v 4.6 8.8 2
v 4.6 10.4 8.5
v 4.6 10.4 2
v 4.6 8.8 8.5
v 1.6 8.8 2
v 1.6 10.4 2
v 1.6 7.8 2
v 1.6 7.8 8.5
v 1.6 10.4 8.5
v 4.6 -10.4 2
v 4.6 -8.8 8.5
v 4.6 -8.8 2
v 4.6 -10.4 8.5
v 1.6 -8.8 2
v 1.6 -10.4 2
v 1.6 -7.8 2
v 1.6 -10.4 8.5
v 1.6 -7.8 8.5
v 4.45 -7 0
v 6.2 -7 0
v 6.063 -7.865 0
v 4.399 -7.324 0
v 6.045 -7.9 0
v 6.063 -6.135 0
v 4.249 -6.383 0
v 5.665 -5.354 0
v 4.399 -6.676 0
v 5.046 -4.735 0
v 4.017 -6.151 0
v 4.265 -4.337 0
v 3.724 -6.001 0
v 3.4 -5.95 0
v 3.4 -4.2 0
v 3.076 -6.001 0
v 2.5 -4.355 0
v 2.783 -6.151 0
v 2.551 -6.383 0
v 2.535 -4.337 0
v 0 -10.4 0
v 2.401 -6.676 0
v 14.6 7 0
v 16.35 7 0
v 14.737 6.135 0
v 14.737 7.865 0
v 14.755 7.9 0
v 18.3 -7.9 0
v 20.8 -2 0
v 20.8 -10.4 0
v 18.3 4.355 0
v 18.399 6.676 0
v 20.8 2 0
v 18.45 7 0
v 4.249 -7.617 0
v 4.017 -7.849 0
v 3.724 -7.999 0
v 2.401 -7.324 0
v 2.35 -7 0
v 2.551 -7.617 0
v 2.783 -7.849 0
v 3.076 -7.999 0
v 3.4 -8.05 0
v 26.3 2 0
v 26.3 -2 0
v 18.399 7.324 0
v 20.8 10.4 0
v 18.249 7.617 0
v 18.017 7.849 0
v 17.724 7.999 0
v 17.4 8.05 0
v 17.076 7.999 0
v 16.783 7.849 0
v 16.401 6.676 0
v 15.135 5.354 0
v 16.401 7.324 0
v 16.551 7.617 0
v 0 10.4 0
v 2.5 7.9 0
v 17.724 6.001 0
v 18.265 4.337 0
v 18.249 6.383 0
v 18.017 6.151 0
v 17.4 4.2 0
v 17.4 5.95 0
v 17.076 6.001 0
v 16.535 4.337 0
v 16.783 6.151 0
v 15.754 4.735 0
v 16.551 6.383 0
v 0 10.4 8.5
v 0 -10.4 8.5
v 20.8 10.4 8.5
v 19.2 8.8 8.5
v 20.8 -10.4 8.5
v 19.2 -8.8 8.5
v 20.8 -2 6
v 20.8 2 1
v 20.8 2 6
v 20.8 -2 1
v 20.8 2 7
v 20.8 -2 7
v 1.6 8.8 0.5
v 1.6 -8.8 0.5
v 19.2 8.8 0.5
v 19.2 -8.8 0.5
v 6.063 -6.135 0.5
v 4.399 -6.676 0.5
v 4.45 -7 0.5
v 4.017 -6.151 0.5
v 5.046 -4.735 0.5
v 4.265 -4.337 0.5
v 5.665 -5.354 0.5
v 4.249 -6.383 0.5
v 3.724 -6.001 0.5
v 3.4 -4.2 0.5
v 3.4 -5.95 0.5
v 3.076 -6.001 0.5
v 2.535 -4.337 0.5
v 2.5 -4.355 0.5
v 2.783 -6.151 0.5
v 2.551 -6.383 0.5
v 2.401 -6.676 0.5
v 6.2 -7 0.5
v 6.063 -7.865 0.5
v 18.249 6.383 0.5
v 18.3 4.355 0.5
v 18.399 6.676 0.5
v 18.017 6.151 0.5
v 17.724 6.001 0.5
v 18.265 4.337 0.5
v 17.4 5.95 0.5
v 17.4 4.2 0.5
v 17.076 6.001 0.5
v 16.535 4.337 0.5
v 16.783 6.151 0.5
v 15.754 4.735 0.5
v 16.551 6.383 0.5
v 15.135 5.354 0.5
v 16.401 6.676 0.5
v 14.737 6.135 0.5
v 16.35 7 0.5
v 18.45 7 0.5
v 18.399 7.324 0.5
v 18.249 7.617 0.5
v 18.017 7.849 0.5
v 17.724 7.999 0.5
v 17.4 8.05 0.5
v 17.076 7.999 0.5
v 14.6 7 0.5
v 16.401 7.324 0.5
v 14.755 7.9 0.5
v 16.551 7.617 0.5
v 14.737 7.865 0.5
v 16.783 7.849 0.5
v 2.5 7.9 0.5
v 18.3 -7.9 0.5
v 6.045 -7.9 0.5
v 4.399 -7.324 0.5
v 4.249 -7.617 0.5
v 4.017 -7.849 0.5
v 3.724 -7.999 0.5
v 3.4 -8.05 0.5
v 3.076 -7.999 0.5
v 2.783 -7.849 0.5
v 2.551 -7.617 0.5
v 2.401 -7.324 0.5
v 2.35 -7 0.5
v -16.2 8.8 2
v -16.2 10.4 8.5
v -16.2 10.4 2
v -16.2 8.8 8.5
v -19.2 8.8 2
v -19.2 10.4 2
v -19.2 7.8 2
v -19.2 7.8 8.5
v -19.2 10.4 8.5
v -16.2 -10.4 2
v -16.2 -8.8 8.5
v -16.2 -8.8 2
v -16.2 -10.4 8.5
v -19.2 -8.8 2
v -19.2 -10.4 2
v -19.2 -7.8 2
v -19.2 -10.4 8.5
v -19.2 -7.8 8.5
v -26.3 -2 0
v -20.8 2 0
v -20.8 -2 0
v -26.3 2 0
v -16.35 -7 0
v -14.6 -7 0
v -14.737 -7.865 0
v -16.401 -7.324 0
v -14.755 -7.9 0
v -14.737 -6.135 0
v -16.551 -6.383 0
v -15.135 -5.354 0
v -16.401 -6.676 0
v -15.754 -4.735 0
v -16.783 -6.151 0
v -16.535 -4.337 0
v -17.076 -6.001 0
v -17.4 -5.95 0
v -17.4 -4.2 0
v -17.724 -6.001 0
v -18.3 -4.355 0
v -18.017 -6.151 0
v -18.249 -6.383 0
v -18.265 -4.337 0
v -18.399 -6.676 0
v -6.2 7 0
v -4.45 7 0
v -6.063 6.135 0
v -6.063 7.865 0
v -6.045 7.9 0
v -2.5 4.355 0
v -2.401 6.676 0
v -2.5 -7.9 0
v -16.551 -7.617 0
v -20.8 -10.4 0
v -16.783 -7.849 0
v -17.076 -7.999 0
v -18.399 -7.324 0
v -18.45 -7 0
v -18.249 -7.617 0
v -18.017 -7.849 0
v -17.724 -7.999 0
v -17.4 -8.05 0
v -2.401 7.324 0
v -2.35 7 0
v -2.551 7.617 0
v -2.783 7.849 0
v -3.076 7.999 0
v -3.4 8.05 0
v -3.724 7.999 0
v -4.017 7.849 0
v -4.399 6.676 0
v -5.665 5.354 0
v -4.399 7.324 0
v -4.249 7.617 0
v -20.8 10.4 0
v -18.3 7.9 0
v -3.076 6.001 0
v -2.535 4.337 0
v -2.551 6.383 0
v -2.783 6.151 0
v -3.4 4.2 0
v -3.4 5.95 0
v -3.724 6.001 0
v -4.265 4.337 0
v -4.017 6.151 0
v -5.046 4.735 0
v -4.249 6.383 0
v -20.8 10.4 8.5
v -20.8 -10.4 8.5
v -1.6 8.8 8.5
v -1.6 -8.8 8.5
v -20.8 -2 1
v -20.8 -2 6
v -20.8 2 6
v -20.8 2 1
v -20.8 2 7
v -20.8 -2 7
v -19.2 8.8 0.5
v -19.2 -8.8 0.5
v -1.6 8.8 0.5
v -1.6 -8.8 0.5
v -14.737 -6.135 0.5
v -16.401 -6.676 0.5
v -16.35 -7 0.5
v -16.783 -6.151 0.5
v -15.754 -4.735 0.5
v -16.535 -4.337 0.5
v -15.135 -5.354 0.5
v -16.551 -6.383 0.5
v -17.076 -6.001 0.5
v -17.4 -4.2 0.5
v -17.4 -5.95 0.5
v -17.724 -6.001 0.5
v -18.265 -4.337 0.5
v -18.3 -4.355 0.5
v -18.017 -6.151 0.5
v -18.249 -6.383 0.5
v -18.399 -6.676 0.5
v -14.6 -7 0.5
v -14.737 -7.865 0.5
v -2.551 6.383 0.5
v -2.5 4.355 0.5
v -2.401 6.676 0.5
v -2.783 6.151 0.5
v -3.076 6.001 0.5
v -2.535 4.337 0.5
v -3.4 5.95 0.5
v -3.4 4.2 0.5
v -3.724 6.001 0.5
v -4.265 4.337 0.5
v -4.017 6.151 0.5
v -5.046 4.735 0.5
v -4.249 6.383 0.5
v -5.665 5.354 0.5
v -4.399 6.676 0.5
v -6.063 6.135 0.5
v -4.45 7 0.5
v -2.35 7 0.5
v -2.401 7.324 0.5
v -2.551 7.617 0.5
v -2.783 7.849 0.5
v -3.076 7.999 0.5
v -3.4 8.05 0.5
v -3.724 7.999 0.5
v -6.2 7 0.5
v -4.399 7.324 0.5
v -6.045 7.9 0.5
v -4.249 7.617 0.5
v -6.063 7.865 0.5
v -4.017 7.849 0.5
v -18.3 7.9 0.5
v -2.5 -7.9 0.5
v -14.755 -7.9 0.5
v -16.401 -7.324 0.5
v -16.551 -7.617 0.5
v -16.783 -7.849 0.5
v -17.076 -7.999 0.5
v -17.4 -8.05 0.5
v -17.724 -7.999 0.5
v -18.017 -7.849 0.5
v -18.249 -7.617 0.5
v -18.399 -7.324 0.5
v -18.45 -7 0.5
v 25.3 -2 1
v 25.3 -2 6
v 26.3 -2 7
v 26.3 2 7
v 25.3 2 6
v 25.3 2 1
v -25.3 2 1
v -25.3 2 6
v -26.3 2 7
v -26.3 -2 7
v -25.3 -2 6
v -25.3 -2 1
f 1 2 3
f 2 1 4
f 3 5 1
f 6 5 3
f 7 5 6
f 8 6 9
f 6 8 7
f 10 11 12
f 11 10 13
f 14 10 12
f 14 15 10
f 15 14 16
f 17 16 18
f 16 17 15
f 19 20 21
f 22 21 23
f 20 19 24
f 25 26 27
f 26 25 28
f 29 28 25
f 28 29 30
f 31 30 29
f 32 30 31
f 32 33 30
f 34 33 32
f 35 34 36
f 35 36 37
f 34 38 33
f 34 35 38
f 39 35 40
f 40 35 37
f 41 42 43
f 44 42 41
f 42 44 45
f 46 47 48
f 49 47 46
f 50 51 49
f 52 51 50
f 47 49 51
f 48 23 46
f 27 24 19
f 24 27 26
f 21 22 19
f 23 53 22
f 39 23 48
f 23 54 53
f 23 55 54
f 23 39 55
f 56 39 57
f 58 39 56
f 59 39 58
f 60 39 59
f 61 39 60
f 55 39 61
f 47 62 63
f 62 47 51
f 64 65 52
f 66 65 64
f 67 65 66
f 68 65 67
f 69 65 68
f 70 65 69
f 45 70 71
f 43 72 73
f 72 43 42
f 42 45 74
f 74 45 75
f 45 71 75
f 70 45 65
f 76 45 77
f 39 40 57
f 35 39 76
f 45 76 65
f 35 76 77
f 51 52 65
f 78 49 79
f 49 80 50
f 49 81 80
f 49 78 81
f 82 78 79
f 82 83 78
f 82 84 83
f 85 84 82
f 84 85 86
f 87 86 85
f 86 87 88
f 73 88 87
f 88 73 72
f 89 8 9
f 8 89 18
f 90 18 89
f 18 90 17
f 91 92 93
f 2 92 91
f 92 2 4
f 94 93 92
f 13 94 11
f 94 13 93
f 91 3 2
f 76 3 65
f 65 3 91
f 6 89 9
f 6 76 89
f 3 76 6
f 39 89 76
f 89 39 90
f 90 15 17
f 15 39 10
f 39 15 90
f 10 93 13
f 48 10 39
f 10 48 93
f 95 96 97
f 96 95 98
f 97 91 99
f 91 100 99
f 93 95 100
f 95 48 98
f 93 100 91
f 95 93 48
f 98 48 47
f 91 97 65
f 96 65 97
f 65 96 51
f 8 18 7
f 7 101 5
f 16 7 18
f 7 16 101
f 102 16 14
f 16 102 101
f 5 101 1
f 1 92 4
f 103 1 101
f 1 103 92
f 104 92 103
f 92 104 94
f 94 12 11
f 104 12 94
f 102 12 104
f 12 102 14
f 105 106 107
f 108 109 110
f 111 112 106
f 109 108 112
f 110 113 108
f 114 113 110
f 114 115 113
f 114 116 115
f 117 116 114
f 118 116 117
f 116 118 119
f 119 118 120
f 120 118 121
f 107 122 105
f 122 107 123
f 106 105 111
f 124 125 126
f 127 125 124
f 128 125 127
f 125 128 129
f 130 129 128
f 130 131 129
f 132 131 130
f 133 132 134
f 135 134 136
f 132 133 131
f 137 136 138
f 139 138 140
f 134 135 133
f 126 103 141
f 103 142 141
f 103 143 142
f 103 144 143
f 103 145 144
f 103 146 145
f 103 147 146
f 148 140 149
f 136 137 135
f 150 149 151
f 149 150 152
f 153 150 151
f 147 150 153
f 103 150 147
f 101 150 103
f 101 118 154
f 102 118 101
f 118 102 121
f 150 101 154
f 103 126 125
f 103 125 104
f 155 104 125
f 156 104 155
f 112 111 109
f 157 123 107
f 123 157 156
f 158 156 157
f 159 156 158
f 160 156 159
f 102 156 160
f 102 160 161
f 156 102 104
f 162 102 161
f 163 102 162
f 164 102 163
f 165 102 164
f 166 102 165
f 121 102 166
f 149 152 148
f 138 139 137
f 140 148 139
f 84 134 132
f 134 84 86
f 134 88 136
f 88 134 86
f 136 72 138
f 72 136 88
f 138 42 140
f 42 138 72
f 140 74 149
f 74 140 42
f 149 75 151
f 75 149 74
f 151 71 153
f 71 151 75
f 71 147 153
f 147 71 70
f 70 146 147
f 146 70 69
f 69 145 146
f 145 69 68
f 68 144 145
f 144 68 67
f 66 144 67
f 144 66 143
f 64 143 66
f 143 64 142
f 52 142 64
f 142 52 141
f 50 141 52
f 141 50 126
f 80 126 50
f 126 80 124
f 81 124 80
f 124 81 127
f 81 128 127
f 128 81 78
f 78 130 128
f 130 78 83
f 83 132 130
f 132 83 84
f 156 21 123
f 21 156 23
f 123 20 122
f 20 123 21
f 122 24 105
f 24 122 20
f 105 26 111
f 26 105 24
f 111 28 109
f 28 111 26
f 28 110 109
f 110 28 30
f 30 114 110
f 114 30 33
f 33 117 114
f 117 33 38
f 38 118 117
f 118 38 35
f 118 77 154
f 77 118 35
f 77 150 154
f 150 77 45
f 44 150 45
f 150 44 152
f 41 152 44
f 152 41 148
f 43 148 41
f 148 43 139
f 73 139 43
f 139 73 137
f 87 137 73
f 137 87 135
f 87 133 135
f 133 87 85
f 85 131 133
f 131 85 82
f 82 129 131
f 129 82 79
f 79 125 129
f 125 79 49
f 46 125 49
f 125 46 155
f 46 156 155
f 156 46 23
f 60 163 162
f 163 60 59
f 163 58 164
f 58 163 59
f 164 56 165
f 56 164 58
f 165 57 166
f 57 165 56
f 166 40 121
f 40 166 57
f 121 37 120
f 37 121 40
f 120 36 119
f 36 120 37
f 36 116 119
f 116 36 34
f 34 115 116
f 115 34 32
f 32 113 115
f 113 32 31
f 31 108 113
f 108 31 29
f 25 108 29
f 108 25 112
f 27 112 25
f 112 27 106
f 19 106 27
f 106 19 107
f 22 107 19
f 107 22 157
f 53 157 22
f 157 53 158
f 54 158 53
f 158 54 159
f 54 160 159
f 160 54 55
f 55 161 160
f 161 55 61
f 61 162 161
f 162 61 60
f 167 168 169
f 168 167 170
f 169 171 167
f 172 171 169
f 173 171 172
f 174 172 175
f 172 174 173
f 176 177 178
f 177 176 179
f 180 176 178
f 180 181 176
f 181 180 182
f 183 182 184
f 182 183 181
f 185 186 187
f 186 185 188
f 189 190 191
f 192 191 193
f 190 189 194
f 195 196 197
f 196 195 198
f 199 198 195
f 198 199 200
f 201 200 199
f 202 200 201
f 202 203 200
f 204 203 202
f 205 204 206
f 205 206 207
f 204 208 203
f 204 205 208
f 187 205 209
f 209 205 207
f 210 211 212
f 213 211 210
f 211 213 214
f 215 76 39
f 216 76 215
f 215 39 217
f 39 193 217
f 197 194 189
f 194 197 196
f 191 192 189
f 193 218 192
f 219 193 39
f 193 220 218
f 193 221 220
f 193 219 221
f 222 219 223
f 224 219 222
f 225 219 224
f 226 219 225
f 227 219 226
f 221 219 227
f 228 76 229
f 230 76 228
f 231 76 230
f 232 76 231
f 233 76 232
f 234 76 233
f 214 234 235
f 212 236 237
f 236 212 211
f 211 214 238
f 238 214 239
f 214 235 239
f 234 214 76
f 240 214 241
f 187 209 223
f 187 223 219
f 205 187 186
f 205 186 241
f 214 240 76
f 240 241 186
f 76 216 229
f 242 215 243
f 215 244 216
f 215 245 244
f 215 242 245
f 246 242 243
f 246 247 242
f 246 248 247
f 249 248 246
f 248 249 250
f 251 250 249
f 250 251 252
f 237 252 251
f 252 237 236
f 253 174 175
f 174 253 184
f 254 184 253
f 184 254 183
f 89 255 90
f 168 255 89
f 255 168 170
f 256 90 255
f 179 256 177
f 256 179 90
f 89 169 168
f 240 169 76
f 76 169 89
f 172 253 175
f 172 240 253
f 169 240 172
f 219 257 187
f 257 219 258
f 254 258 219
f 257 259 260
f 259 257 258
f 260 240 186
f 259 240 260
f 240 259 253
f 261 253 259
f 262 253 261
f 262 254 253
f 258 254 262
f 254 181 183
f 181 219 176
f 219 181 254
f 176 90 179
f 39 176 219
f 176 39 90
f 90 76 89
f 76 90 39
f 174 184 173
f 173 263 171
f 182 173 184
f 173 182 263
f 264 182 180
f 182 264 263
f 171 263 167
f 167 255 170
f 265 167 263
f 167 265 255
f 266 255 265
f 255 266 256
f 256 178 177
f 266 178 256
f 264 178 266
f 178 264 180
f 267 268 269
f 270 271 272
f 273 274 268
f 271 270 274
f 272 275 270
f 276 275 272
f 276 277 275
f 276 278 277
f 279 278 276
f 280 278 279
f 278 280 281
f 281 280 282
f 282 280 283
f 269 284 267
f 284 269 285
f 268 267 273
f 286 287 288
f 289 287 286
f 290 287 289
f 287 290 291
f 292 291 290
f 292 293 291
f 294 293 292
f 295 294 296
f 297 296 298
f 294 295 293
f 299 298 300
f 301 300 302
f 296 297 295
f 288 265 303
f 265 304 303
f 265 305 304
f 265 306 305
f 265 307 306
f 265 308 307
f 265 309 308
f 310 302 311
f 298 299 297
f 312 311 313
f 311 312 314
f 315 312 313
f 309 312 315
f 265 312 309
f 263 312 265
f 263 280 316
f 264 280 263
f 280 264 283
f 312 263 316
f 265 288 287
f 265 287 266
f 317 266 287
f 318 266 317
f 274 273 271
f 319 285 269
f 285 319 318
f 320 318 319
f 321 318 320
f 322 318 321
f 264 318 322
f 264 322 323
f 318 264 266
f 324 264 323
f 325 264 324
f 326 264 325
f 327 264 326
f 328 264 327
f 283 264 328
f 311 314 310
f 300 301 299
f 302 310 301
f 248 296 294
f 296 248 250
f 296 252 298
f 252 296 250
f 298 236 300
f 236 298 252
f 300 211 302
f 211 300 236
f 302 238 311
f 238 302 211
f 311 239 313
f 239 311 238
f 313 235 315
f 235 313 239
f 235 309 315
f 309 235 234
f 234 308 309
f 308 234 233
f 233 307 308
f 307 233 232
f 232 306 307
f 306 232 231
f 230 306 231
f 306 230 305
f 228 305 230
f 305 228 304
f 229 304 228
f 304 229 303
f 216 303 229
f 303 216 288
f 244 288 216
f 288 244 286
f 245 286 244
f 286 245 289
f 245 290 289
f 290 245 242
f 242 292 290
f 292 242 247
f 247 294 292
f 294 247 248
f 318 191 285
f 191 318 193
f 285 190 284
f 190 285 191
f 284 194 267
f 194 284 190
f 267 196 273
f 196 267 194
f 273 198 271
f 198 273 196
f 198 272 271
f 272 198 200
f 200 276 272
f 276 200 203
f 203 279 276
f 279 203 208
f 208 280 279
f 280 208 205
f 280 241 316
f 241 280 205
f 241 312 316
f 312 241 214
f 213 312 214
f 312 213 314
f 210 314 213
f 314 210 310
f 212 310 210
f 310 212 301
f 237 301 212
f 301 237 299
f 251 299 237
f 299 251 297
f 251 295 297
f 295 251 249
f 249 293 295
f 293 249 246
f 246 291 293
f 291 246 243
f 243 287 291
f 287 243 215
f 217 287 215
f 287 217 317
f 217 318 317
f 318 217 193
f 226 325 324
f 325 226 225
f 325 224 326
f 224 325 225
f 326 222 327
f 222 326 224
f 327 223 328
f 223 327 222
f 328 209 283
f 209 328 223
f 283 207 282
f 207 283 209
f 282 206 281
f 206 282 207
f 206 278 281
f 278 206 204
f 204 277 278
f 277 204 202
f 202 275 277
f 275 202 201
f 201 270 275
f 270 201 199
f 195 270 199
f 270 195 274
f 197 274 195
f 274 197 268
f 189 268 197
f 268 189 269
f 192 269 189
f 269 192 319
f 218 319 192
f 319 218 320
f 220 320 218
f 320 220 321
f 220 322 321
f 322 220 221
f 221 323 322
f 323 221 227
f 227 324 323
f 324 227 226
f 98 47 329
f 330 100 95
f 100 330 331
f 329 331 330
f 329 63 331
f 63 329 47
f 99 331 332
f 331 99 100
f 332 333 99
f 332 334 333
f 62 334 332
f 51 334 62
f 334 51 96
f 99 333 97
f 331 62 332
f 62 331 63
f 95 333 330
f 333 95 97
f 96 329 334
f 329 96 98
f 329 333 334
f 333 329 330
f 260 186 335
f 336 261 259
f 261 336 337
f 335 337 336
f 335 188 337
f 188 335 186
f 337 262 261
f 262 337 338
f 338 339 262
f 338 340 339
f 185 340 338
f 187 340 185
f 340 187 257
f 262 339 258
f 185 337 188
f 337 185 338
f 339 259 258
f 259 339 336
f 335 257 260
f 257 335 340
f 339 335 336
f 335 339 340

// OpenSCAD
// Fan dimensions
fan_width = 17.0;
fan_height = 8.0;
fan_hole_dist = 14.0; // measure
fan_hole_dia = 1.8;

wall_thickness = 1.6;
mount_sheet_thickness = 0.5;

// Tolerance
tol = 0.3;

// Gap between skin and the fan (mm)
gap = 8;

rubber_band_thickness = 2.8;
rubber_band_width = 5;

$fn = 20;

// assembly view
//    translate([0, 0, body_height+tol])
//    slit();
translate([outer_width/2, 0, 0])
    fan_mount();
translate([-outer_width/2, 0, 0])
    fan_mount();
//translate([outer_width/2, outer_width/2, 0])
//    fan_mount();
//translate([-outer_width/2, outer_width/2, 0])
//    fan_mount();
//    rubberband_clamp();

// individual
//slit();

//fan_mount();
//rubberband_clamp();



// Derivated numbers
clamp_width = wall_thickness*2 + rubber_band_thickness;
inner_width = fan_width+tol*2;
outer_width = inner_width + wall_thickness*2;
body_height = mount_sheet_thickness+fan_height;

///////////// Youngbo Added /////////////
// Right part
// Gap between fans' center(mm)
fan_gap = outer_width;
fan_inner_gap = 2.5;

// Bridge thickness between fan mound modules(mm)
bridge_thick = 2;

// Wing hole size(mm)
wing_width = 1.5;
wing_height = outer_width - 2;

// Left or Right
LoR = 1;

//wing();
rotate([0,0,270])
    wire_mount();
//rotate([0,0,180])
//    wing();
rotate([0,0,90])
    wire_mount();

// Bridge drawing
module bridge()
{
    translate([0, 0, bridge_thick/2])
    cube([outer_width, fan_gap - outer_width, bridge_thick], true);
}
// Wing drawing
module wing()
{
    // Top wing
    difference(){
        translate([0, outer_width + fan_inner_gap, bridge_thick/2])
        cube([2*outer_width, 2*fan_inner_gap, bridge_thick], true);
        translate([0, outer_width + fan_inner_gap - 1, bridge_thick/2])
        cube([2*outer_width - 4, wing_width*2, bridge_thick*2], true);
    }
}

module wire_mount()
{
    // Wire mount(bottom)
    difference(){
        translate([0, (fan_gap + outer_width)/2 + 2, 3.5])
        cube([4, 7, 7], center=true);
        translate([0, (fan_gap + outer_width)/2 + 2, 3.5])
        cube([4 + 1, 5, 5], center=true);
    }
}
///////////// Youngbo Added /////////////

//linear_extrude(body_height)
//translate([outer_width/2+wall_thickness,0,0])
//difference(){
//square([rubber_band_thickness+2*wall_thickness, rubber_band_width+2*wall_thickness], center=true);
//
//square([rubber_band_thickness, rubber_band_width], center=true);
//}
//
//translate([0,0,(body_height)/2-1])
//linear_extrude(2)
//translate([rubber_band_thickness+2*wall_thickness+rubber_band_width/2+2*wall_thickness,0,0])
//square([outer_width/1.8, rubber_band_width+2*wall_thickness], center=true);


module rubberband_clamp()
{
    for(rot = [0, 180])
    {
        rotate([0,0,rot])
        {
            difference()
            {
                union()
                {
                    translate([outer_width/2, -outer_width/2])
                    cube([clamp_width, outer_width, body_height+gap - clamp_width/2]);
                    
                    translate([outer_width/2 + clamp_width/2, -outer_width/2, body_height+gap-clamp_width/2])
                    rotate([-90, 0, 0])
                    cylinder(d=clamp_width, h=outer_width);
                }
                
                
                // rubber band channel
                translate([outer_width/2 + wall_thickness + tol, -outer_width/2])
                cube([rubber_band_thickness - tol*2, outer_width, 2]);
                
                translate([outer_width/2 + wall_thickness, -outer_width/2, 1.5])
                cube([rubber_band_thickness, outer_width, rubber_band_width + tol]);
                
                // air flow gap
                hull()
                {
                    translate([outer_width/2, 0, body_height+gap-4.5])
                    cube([clamp_width*2, 3, 1], center=true);
                    
                    translate([outer_width/2,0,body_height+gap+1])
                    cube([clamp_width*2, outer_width-5, 1], center=true);
                }
            }   
        }
    }
}

module fan_mount()
{
    linear_extrude(height=mount_sheet_thickness)
    fan_mount_profile();


    difference()
    {
        linear_extrude(height=body_height)
        main_body_profile();
        
        // wire channel
        union()
        {
            translate([-inner_width/2, inner_width/2-1, 2])
            cube([3, 3, 7]);
            translate([-inner_width/2, -inner_width/2-2, 2])
            cube([3, 3, 7]);
        }

    }
    
    
    
    
    module main_body_profile()
    {
        difference()
        {
            union()
            {
                square([outer_width, outer_width], center=true);
            }
            square([inner_width, inner_width], center=true);
        }
    }
    

    module fan_mount_profile()
    {
        difference()
        {
            union()
            {
                for(rot = [0:3])
                {
                    rotate([0,0,rot*90])
                    {
                        // mounting hole columns
                        translate([fan_hole_dist/2, fan_hole_dist/2])
                        if(rot == 0 || rot == 2)
                        circle(d=fan_hole_dia+wall_thickness*2+tol*2);
                        
                        // bridges
                        translate([0, (fan_hole_dist+fan_hole_dia+wall_thickness)/2])
                        square([fan_hole_dist + 4, wall_thickness], center=true);                
                    }
                }
            }


            // mounting holes - inner
            for(rot = [0:3])
                if(rot == 0 || rot == 2)
                    rotate([0,0,rot*90])
                        translate([fan_hole_dist/2, fan_hole_dist/2])
                            circle(d=fan_hole_dia+tol);
        }
     
    }
}


module slit()
{
    intersection()
    {
        union()
        {
            for(i=[-4:4])
            {
                translate([-25, i*3, -1])
                rotate([45, 0, 0])
                cube([50, 0.8, 6]);
            }
        }
        
        cylinder(d=16, h=15);
    }

    difference()
    {
        translate([-outer_width/2+tol,-outer_width/2+tol])
        cube([outer_width-tol*2, outer_width-tol*2, 5]);

        cylinder(d=15, h=6);
    }
}
